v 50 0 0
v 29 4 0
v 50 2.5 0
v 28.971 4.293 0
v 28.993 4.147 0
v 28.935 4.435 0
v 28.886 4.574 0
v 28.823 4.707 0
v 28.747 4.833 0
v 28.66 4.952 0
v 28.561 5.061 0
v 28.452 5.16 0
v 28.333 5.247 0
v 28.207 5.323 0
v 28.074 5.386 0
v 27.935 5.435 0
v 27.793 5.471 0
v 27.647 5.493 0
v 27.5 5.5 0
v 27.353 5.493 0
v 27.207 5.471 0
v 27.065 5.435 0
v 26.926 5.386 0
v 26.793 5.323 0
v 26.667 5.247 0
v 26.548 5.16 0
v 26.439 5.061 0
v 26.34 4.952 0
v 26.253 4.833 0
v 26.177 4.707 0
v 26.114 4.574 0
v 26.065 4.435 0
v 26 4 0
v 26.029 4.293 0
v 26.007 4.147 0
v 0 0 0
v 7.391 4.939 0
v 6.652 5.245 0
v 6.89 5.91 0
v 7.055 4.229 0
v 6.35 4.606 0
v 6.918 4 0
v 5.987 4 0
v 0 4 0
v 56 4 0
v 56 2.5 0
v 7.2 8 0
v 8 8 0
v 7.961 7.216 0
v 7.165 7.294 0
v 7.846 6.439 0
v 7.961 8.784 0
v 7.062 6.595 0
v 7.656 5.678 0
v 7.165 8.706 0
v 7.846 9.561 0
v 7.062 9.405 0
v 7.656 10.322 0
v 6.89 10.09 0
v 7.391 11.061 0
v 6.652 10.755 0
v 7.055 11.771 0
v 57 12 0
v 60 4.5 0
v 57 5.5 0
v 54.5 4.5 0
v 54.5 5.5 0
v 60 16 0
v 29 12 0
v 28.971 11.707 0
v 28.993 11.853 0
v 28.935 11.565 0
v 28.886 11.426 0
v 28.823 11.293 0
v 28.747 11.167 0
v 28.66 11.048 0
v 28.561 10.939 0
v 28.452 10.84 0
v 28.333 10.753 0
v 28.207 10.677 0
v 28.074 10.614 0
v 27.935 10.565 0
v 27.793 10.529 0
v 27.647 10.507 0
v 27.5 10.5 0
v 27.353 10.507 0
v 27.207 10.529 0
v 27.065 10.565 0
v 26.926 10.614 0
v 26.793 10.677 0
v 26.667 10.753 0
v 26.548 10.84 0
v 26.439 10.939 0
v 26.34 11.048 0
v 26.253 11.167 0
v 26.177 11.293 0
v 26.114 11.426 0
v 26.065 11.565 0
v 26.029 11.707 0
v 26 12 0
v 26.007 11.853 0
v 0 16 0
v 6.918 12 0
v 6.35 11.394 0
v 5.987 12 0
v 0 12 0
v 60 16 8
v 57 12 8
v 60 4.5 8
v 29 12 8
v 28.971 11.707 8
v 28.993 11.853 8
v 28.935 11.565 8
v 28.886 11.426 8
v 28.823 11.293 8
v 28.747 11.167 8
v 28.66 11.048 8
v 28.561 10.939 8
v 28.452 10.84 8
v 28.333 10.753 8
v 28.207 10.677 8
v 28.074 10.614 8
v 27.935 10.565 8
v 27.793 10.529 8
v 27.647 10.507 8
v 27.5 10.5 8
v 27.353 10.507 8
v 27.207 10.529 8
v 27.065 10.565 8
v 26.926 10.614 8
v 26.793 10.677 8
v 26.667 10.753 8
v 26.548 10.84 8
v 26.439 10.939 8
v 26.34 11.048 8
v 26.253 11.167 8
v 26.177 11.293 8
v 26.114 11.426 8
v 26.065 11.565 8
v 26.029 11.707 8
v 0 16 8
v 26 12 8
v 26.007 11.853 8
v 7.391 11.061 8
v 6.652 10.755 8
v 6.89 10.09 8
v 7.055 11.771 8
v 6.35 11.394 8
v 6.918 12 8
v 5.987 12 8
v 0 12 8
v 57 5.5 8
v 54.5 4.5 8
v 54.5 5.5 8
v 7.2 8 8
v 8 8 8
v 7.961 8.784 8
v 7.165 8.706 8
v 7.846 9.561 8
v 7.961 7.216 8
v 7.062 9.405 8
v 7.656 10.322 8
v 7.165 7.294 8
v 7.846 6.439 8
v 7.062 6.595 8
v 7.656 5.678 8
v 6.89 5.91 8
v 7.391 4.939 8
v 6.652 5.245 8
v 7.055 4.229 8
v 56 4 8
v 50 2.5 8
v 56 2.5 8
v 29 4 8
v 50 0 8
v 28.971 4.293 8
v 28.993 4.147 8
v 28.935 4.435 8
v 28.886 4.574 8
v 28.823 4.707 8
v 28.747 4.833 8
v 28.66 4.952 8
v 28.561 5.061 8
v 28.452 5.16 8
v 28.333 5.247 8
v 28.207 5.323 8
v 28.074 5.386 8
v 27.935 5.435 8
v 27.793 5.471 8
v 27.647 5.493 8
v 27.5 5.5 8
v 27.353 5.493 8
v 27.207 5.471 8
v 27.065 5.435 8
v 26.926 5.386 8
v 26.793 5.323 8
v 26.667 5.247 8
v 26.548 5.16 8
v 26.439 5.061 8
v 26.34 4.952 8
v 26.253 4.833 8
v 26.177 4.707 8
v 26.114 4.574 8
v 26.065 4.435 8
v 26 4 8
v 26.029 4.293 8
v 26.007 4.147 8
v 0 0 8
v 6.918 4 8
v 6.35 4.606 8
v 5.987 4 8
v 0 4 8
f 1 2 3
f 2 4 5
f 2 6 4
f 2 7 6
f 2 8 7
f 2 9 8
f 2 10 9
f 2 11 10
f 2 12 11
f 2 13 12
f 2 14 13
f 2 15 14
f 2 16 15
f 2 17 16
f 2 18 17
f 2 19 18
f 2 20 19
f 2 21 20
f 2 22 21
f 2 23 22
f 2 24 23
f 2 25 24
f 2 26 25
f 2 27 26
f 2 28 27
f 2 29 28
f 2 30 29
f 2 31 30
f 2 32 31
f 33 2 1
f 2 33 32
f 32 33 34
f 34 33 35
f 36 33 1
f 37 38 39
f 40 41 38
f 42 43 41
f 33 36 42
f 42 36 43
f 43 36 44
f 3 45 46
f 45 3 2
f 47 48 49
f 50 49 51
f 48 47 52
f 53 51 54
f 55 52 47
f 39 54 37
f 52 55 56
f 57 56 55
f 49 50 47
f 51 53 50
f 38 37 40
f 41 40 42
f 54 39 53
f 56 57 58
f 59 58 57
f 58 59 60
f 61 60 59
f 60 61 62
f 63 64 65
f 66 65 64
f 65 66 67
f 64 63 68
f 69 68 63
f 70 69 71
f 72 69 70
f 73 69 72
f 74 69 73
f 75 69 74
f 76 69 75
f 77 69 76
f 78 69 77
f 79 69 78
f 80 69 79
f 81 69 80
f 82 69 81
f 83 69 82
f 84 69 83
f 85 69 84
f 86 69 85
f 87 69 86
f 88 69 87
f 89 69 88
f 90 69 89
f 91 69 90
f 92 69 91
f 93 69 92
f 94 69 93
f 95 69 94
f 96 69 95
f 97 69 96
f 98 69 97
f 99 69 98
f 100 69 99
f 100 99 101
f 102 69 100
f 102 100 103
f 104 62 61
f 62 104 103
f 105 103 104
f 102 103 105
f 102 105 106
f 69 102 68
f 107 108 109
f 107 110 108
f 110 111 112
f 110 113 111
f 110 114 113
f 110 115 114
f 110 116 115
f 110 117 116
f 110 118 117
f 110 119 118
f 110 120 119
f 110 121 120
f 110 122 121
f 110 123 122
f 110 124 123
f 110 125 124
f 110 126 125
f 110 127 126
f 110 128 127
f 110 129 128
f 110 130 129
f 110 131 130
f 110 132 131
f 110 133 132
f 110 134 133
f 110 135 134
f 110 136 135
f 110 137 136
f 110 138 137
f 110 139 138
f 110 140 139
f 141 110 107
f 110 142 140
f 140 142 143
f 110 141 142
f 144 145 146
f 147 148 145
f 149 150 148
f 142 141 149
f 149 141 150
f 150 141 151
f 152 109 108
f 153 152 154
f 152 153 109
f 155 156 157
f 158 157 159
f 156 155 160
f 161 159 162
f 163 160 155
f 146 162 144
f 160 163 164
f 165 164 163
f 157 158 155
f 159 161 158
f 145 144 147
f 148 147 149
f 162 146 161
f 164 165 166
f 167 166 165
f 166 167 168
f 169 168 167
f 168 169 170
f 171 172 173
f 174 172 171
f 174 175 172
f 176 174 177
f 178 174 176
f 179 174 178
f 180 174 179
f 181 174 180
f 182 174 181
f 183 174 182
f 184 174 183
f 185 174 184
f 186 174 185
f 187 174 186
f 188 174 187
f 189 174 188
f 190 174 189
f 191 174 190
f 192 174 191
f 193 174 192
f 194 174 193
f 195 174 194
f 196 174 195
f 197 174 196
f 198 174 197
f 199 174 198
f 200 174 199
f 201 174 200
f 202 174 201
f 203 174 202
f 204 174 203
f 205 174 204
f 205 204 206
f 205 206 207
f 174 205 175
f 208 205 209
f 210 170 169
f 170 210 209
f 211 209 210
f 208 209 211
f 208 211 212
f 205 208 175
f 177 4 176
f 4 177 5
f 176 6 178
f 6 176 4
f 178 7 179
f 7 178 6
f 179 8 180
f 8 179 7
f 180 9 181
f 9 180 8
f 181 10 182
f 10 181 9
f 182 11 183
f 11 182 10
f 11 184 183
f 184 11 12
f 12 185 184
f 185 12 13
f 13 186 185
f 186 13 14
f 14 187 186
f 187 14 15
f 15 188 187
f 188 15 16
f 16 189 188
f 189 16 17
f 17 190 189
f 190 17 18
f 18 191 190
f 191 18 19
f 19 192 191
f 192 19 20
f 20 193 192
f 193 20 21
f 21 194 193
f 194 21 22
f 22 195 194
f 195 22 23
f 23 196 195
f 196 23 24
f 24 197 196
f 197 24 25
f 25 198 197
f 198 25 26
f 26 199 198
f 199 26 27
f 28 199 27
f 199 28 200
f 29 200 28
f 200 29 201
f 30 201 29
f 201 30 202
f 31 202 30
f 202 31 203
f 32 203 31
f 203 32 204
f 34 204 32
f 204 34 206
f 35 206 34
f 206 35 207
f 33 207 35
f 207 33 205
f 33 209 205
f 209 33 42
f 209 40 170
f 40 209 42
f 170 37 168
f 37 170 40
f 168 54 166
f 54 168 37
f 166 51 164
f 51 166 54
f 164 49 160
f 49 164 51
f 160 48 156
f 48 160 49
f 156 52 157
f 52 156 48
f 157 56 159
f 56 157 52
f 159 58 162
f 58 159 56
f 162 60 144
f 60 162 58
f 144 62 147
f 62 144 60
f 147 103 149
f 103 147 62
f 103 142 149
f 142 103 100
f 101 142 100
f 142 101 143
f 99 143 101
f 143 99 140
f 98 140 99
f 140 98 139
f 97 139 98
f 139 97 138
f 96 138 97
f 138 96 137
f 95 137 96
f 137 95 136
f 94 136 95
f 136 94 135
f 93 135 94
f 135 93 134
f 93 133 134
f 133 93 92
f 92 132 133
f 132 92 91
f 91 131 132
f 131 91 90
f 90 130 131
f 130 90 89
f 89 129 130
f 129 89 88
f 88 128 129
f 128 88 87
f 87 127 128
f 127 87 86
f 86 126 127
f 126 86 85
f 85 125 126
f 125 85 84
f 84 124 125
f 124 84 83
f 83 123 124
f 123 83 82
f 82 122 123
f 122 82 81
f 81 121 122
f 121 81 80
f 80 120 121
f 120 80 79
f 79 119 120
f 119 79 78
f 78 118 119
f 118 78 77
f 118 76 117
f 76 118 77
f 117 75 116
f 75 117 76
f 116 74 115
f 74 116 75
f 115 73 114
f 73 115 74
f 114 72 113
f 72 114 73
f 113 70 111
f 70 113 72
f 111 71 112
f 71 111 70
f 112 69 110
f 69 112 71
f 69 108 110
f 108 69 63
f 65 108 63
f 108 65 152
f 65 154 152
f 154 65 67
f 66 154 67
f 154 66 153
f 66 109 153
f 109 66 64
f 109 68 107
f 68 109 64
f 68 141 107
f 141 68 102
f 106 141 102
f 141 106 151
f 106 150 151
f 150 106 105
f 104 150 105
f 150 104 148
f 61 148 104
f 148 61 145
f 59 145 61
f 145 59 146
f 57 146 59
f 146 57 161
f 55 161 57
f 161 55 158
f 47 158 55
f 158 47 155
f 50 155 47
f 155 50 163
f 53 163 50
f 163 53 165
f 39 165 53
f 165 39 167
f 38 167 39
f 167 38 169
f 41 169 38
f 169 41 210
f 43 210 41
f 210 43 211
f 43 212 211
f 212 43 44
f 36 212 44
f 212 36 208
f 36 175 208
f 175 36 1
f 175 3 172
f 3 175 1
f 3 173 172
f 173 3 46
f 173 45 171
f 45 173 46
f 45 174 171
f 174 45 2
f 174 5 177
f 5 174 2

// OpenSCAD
// Pinch clamp for silicone tubing with living hinge and snap latch
// Designed for FDM printing: printed flat in the XY plane.
// The part is constructed as a single 2-D profile extruded 8mm along Z.

// --- Dimensions ---
lower_bar_l      = 50.0;   // Length of lower bar
lower_bar_w       = 4.0;    // Width of lower bar
tongue_l          = 6.0;    // Length of tongue
tongue_y_start    = 2.5;    // Y start of tongue
tongue_y_end      = 4.0;    // Y end of tongue

upper_bar_l       = 60.0;   // Length of upper bar
upper_bar_w       = 4.0;    // Width of upper bar
upper_bar_y_start = 12.0;   // Y start of upper bar
upper_bar_y_end   = 16.0;   // Y end of upper bar

hinge_center_x    = 0.0;    // Hinge center X
hinge_center_y    = 8.0;    // Hinge center Y
hinge_r_inner      = 7.2;    // Inner radius of hinge
hinge_r_outer      = 8.0;    // Outer radius of hinge

ridge_radius      = 1.5;    // Radius of the pinch ridge
ridge_x           = 27.5;    // X position of the ridge

latch_leg_x_start  = 57.0;   // X start of latch leg
latch_leg_x_end    = 60.0;   // X end of latch leg
latch_leg_y_start  = 4.5;    // Y start of latch leg
latch_leg_y_end    = 12.0;   // Y end of latch leg

latch_nose_x_start = 54.5;   // X start of latch nose
latch_nose_x_end   = 57.0;   // X end of latch nose
latch_nose_y_start = 4.5;    // Y start of latch nose
latch_nose_y_end   = 5.5;    // Y end of latch nose

thickness          = 8.0;    // Extrusion height (Z)

$fn = 64;

// --- 2D Profile Construction ---
// We build the 2D silhouette using a union of shapes.
// To ensure the ridges are "half-round" on the inner face, 
// we add semi-circles to the profile.

module final_2d_profile() {
    union() {
        // 1. Lower Bar
        square([lower_bar_l, lower_bar_w]);
        
        // 2. Tongue
        translate([lower_bar_l, tongue_y_start])
            square([tongue_l, tongue_y_end - tongue_y_start]);
            
        // 3. Upper Bar
        translate([0, upper_bar_y_start])
            square([upper_bar_l, upper_bar_w]);
            
        // 4. Hinge (Half-ring on the x < 0 side)
        translate([hinge_center_x, hinge_center_y])
        difference() {
            circle(r = hinge_r_outer);
            circle(r = hinge_r_inner);
            // Cut to keep only the part where x < 0
            // We use a large square to ensure the cut is clean
            translate([-hinge_r_outer - 1, -hinge_r_outer - 1])
                square([hinge_r_outer + 2, hinge_r_outer * 2 + 2]);
        }
        
        // 5. Latch Leg
        translate([latch_leg_x_start, latch_leg_y_start])
            square([latch_leg_x_end - latch_leg_x_start, latch_leg_y_end - latch_leg_y_start]);
            
        // 6. Latch Nose
        translate([latch_nose_x_start, latch_nose_y_start])
            square([latch_nose_x_end - latch_nose_x_start, latch_nose_y_end - latch_nose_y_start]);
            
        // 7. Ridges (Half-rounds)
        // To make them "half-round" on the inner face, we add semi-circles 
        // to the profile at the specified locations.
        
        // Lower Ridge (centered at ridge_x, 4)
        // Since the bar is y=0 to 4, the ridge extends from y=4 upwards.
        translate([ridge_x, 4])
            circle(r = ridge_radius);
            
        // Upper Ridge (centered at ridge_x, 12)
        // Since the bar is y=12 to 16, the ridge extends from y=12 downwards.
        translate([ridge_x, 12])
            circle(r = ridge_radius);
    }
}

// --- Final 3D Model ---
// The prompt asks for the profile to be extruded 8mm along Z.
// We use a difference to ensure the ridges are semi-circles 
// (protrusions) rather than full circles by cutting the "outside" 
// part of the circle from the profile.

difference() {
    // The main extruded body
    linear_extrude(height = thickness) 
        final_2d_profile();
    
    // Subtract the "outer" half of the ridge circles to make them semi-circles
    // Lower ridge subtraction (cut everything below y=4)
    translate([ridge_x, 4 - ridge_radius])
        square([ridge_radius * 2 + 2, ridge_radius]);
        
    // Upper ridge subtraction (cut everything above y=12)
    translate([ridge_x, 12])
        square([ridge_radius * 2 + 2, ridge_radius]);
        
    // Subtract the "inner" part of the hinge to ensure it's a ring
    // (Already handled by difference in the hinge module, but we ensure 
    // the extrusion doesn't fill the center of the hinge)
    translate([hinge_center_x, hinge_center_y])
        circle(r = hinge_r_inner);
}

// Note: The hinge is a "half-ring" on the x < 0 side. 
// The logic above creates a solid part with a hinge-shaped cutout 
// on the left side.
